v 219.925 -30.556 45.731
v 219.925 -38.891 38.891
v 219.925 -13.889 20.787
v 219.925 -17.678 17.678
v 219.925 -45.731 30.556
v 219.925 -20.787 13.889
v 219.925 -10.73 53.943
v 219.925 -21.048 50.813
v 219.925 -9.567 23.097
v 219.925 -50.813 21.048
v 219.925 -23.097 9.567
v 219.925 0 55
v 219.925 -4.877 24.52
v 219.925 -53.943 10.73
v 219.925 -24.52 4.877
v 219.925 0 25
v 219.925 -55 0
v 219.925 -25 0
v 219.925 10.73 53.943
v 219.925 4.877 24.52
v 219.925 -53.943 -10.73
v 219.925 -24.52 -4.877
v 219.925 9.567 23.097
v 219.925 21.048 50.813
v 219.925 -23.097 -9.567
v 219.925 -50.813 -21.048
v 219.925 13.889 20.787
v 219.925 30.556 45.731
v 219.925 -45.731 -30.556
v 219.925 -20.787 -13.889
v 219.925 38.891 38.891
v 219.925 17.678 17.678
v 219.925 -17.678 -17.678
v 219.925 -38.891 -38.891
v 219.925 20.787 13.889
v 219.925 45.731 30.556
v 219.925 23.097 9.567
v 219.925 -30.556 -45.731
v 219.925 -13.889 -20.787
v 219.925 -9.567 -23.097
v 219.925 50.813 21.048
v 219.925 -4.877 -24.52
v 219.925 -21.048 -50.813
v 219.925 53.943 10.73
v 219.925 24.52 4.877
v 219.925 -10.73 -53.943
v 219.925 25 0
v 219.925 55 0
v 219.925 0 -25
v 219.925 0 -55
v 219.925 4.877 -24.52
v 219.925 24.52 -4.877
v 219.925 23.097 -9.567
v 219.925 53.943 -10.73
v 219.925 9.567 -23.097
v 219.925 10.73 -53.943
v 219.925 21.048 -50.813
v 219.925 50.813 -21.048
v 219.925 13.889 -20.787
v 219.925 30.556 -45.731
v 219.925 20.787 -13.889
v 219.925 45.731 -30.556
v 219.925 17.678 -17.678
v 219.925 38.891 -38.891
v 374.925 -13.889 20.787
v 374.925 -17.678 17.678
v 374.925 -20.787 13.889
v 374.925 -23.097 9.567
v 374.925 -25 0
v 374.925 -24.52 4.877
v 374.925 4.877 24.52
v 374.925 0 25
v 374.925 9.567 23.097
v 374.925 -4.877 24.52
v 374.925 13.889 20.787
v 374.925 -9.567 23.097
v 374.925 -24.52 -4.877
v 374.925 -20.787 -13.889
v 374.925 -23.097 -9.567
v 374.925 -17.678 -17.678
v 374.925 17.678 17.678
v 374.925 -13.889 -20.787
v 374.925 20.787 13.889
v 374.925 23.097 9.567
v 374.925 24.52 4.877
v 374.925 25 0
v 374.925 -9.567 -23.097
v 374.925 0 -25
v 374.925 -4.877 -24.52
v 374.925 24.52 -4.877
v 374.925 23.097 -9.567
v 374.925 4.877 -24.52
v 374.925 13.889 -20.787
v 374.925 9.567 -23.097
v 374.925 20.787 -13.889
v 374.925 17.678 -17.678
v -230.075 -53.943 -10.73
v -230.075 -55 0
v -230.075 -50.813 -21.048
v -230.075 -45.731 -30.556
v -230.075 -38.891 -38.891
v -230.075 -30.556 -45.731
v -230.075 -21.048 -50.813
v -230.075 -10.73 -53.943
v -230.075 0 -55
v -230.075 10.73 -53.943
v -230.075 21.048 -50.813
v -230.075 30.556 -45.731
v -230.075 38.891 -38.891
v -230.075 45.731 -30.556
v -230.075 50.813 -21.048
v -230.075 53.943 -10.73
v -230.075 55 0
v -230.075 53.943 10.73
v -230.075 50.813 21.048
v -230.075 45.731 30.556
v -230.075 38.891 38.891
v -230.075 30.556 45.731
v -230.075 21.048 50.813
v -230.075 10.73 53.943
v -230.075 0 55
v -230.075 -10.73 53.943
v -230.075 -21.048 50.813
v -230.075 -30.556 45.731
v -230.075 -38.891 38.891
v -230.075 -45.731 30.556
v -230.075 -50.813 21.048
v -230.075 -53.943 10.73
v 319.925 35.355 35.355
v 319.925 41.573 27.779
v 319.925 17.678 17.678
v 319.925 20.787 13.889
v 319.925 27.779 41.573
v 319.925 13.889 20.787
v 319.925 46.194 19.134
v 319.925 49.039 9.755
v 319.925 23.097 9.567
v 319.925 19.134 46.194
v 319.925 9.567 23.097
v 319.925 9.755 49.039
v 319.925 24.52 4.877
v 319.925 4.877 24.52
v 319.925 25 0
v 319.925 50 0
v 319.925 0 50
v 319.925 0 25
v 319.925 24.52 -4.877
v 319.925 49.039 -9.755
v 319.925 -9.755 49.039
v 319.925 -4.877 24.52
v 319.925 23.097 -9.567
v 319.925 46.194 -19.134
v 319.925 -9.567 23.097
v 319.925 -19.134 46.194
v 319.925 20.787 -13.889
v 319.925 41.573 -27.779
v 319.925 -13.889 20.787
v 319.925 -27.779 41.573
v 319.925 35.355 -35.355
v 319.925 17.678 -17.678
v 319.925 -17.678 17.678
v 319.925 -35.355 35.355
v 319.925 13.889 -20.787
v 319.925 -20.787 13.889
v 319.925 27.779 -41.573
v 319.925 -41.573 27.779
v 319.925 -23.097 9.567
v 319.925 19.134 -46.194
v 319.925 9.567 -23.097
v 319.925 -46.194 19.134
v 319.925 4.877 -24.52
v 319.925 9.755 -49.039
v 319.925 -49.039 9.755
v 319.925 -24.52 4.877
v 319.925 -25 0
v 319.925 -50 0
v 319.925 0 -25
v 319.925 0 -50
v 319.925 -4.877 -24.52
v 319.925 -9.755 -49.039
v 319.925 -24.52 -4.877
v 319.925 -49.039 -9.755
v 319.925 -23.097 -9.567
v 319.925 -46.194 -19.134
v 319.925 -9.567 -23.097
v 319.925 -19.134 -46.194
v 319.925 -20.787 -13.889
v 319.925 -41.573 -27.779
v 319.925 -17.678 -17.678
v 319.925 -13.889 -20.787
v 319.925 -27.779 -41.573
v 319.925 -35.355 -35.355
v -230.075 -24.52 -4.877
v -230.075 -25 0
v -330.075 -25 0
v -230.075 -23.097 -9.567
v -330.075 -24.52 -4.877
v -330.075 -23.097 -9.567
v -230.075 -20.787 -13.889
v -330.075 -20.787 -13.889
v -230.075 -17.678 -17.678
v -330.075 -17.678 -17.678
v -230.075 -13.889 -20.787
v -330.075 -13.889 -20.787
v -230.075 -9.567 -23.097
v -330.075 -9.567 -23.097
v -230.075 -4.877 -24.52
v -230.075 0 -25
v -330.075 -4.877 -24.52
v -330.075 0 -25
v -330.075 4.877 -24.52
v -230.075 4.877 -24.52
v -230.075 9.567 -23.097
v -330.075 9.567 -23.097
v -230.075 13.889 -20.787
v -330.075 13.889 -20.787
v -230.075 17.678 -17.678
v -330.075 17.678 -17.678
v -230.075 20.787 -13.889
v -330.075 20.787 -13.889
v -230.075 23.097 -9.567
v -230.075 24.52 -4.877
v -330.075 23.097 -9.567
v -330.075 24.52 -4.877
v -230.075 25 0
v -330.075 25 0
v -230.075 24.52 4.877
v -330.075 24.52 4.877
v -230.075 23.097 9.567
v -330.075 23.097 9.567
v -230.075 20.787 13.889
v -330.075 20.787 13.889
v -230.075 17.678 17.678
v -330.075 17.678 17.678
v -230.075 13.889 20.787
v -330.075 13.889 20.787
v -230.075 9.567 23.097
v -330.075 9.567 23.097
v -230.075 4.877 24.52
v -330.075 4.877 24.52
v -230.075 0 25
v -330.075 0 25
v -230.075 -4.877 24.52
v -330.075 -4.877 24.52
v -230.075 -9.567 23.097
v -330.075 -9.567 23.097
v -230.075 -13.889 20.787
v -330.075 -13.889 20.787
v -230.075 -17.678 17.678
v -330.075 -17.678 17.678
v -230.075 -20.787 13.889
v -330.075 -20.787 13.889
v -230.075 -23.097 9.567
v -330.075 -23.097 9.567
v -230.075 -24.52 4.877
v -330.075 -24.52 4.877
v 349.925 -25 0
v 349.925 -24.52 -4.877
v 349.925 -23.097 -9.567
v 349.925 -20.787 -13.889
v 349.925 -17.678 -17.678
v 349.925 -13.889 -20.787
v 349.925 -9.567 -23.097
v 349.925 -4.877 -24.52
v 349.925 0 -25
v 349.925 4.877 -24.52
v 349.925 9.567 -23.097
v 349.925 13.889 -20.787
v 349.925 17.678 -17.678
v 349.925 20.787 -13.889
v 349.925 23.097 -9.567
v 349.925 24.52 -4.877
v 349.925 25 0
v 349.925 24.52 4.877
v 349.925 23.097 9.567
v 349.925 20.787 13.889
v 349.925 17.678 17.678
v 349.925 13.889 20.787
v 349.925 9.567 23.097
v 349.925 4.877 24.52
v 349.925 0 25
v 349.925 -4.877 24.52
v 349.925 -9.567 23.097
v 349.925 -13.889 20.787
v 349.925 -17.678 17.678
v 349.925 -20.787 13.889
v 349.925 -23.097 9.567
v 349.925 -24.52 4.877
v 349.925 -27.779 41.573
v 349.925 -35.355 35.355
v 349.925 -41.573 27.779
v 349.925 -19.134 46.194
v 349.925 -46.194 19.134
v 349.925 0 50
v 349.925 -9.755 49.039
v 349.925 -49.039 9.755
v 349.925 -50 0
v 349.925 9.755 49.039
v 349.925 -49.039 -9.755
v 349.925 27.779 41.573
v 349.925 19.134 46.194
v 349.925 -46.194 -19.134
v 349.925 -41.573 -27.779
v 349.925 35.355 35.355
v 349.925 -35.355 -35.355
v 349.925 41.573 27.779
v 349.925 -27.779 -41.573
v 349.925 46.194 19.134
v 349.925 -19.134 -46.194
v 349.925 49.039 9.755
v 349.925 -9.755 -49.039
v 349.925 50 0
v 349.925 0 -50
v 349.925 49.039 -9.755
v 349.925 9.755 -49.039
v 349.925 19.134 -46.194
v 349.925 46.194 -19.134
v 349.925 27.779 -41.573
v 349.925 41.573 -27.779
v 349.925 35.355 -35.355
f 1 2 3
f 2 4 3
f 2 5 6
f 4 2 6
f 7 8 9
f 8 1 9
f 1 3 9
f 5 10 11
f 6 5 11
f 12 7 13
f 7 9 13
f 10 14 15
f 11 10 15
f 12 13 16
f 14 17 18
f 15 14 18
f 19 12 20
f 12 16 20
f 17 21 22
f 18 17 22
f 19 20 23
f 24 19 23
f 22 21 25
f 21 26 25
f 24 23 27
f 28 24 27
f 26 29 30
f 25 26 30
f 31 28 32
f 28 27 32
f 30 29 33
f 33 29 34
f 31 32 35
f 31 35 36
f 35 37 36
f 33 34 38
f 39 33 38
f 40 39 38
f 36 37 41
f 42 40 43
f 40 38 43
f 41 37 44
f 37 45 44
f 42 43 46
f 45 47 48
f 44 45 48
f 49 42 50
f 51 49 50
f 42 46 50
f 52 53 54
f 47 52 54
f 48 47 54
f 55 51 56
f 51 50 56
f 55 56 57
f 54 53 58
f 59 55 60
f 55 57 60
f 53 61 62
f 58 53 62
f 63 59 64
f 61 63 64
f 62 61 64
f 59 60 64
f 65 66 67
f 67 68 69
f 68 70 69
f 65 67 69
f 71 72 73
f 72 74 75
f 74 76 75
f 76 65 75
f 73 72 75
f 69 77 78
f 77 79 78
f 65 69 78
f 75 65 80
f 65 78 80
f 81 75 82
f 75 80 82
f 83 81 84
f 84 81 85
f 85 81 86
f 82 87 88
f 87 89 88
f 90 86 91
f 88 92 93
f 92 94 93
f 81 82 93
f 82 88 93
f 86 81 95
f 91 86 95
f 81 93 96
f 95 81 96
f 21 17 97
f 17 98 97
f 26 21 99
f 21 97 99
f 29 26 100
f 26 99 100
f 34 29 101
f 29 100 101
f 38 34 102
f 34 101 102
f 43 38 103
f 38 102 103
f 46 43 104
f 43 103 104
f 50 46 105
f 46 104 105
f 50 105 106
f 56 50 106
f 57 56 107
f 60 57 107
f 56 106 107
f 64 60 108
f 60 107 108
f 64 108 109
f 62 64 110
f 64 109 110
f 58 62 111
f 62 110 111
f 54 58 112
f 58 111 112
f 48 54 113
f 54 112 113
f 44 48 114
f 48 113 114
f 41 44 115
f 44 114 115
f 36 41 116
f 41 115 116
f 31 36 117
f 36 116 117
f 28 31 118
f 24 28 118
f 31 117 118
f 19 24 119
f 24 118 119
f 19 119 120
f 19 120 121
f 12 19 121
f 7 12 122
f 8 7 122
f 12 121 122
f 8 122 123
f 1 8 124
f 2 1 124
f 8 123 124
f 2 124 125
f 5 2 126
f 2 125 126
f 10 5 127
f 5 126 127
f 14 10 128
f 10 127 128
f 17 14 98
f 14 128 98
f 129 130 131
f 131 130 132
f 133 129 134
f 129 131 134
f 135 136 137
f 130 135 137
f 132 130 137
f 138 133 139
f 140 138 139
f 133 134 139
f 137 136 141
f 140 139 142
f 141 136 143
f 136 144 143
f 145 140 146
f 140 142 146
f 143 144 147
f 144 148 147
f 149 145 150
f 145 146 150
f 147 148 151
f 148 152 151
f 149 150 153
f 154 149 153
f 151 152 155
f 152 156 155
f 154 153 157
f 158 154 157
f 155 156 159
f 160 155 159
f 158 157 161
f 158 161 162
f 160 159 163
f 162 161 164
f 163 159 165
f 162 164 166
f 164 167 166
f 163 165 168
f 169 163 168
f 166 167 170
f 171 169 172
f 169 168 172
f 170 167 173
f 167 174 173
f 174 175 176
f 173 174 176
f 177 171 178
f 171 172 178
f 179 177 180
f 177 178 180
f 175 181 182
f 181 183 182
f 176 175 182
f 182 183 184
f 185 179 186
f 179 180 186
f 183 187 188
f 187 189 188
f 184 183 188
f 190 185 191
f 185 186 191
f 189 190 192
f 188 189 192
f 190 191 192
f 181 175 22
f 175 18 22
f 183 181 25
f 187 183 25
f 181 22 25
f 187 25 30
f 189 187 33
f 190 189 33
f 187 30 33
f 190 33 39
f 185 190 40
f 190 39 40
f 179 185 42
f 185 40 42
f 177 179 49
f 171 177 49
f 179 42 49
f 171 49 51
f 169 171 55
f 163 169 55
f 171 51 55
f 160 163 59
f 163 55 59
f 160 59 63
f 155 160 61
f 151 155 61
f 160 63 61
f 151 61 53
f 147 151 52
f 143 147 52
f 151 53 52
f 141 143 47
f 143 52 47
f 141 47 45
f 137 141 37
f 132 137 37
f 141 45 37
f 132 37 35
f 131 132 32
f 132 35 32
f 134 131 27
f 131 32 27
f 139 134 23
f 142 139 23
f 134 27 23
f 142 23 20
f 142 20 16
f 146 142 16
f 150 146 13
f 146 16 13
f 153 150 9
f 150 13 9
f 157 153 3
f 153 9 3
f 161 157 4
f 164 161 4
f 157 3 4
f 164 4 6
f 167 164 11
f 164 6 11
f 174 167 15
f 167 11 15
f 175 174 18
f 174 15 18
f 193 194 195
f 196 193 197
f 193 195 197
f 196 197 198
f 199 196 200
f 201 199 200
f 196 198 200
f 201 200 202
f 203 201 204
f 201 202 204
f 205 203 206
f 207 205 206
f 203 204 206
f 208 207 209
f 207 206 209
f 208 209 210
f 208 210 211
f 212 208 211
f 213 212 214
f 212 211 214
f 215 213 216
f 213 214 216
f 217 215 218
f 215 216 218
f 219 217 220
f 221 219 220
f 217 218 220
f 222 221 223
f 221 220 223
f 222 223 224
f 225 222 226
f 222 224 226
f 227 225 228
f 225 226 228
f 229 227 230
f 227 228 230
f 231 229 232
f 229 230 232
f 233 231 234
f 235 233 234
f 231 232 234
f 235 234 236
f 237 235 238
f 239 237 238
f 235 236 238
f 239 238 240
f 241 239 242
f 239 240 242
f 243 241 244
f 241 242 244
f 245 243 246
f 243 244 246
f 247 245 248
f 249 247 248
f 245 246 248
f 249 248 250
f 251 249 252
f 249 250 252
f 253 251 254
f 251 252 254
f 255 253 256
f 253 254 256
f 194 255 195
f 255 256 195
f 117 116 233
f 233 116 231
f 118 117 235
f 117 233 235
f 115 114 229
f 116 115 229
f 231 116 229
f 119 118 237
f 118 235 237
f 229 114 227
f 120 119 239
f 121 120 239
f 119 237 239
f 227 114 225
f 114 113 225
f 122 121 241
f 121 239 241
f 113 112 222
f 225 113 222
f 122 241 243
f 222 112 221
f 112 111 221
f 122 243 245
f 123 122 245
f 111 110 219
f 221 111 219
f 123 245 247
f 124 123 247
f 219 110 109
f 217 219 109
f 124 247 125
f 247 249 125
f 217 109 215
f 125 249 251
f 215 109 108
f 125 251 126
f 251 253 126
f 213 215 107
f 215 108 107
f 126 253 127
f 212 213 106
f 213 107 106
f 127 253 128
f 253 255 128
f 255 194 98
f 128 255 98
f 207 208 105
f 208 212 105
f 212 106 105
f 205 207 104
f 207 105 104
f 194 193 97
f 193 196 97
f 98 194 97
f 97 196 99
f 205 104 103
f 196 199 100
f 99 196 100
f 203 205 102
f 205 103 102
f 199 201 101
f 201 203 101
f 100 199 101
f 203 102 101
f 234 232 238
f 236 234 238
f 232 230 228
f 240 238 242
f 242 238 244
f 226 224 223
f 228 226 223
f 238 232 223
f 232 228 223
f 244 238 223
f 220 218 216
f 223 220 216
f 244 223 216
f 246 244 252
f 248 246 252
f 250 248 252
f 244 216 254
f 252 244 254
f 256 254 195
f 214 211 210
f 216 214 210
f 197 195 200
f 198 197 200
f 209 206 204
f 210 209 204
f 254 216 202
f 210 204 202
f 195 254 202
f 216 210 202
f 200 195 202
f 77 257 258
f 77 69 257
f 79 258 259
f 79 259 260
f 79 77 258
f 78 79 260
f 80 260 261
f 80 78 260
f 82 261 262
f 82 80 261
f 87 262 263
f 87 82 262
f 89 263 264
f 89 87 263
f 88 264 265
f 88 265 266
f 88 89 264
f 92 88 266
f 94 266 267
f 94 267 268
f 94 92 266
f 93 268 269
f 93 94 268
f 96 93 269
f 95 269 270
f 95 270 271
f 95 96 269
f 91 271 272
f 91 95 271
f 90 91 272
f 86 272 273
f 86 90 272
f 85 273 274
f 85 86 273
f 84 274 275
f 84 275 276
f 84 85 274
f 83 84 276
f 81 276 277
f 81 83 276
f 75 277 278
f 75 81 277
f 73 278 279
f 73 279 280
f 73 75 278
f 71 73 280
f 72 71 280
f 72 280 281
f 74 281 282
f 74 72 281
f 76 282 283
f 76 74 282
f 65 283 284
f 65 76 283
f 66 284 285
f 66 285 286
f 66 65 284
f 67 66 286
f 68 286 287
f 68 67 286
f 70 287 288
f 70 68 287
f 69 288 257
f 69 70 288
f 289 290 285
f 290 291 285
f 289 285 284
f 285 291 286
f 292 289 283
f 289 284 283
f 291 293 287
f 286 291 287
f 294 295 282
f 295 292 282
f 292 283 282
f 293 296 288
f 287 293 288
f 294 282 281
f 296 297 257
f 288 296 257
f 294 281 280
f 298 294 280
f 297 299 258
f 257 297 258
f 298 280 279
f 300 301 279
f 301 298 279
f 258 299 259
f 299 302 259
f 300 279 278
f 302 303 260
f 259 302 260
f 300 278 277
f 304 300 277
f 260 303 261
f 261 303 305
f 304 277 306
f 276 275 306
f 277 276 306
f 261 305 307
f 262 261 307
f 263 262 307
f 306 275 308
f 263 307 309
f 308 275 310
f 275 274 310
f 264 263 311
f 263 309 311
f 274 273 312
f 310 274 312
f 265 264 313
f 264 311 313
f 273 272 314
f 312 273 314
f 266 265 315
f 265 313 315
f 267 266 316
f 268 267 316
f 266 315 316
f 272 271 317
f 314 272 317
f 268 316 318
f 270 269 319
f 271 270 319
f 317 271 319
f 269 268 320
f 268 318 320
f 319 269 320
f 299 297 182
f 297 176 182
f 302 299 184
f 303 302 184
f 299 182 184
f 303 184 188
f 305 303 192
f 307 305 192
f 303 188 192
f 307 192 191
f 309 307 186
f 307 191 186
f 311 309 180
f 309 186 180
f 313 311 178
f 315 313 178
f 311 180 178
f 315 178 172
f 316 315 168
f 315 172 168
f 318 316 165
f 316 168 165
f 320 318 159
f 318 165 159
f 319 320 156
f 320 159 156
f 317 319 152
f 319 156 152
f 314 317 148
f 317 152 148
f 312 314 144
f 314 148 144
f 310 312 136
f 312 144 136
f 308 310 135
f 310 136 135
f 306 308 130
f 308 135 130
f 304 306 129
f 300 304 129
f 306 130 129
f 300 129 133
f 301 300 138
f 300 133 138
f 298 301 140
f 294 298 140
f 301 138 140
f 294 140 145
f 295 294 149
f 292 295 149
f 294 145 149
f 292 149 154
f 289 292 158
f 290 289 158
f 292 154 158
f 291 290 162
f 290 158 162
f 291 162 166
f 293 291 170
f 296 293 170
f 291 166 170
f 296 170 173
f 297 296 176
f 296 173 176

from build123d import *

# Parameters (mm, degrees)
SKETCH1_W = 25
SKETCH1_H = 25


with BuildPart() as part:
    # Sketch1 → Revolve1 (revolve)
    with BuildSketch(Plane.XY, mode=Mode.PRIVATE) as revolve1_sk:
        Polygon((-230.074626866, 25), (-330.074626866, 25), (-330.074626866, 0), (349.925373134, 0), (349.925373134, 50), (319.925373134, 50), (319.925373134, 25), (219.925373134, 25), (219.925373134, 55), (-230.074626866, 55), align=None)
        with Locations((362.425373134, 12.5)):
            Rectangle(SKETCH1_W, SKETCH1_H)
    revolve(revolve1_sk.sketch.rotate(Axis((-330.074626866, 0, 0), (1, 0, 0)), 180), axis=Axis((-330.074626866, 0, 0), (1, 0, 0)))


solid = part.part
